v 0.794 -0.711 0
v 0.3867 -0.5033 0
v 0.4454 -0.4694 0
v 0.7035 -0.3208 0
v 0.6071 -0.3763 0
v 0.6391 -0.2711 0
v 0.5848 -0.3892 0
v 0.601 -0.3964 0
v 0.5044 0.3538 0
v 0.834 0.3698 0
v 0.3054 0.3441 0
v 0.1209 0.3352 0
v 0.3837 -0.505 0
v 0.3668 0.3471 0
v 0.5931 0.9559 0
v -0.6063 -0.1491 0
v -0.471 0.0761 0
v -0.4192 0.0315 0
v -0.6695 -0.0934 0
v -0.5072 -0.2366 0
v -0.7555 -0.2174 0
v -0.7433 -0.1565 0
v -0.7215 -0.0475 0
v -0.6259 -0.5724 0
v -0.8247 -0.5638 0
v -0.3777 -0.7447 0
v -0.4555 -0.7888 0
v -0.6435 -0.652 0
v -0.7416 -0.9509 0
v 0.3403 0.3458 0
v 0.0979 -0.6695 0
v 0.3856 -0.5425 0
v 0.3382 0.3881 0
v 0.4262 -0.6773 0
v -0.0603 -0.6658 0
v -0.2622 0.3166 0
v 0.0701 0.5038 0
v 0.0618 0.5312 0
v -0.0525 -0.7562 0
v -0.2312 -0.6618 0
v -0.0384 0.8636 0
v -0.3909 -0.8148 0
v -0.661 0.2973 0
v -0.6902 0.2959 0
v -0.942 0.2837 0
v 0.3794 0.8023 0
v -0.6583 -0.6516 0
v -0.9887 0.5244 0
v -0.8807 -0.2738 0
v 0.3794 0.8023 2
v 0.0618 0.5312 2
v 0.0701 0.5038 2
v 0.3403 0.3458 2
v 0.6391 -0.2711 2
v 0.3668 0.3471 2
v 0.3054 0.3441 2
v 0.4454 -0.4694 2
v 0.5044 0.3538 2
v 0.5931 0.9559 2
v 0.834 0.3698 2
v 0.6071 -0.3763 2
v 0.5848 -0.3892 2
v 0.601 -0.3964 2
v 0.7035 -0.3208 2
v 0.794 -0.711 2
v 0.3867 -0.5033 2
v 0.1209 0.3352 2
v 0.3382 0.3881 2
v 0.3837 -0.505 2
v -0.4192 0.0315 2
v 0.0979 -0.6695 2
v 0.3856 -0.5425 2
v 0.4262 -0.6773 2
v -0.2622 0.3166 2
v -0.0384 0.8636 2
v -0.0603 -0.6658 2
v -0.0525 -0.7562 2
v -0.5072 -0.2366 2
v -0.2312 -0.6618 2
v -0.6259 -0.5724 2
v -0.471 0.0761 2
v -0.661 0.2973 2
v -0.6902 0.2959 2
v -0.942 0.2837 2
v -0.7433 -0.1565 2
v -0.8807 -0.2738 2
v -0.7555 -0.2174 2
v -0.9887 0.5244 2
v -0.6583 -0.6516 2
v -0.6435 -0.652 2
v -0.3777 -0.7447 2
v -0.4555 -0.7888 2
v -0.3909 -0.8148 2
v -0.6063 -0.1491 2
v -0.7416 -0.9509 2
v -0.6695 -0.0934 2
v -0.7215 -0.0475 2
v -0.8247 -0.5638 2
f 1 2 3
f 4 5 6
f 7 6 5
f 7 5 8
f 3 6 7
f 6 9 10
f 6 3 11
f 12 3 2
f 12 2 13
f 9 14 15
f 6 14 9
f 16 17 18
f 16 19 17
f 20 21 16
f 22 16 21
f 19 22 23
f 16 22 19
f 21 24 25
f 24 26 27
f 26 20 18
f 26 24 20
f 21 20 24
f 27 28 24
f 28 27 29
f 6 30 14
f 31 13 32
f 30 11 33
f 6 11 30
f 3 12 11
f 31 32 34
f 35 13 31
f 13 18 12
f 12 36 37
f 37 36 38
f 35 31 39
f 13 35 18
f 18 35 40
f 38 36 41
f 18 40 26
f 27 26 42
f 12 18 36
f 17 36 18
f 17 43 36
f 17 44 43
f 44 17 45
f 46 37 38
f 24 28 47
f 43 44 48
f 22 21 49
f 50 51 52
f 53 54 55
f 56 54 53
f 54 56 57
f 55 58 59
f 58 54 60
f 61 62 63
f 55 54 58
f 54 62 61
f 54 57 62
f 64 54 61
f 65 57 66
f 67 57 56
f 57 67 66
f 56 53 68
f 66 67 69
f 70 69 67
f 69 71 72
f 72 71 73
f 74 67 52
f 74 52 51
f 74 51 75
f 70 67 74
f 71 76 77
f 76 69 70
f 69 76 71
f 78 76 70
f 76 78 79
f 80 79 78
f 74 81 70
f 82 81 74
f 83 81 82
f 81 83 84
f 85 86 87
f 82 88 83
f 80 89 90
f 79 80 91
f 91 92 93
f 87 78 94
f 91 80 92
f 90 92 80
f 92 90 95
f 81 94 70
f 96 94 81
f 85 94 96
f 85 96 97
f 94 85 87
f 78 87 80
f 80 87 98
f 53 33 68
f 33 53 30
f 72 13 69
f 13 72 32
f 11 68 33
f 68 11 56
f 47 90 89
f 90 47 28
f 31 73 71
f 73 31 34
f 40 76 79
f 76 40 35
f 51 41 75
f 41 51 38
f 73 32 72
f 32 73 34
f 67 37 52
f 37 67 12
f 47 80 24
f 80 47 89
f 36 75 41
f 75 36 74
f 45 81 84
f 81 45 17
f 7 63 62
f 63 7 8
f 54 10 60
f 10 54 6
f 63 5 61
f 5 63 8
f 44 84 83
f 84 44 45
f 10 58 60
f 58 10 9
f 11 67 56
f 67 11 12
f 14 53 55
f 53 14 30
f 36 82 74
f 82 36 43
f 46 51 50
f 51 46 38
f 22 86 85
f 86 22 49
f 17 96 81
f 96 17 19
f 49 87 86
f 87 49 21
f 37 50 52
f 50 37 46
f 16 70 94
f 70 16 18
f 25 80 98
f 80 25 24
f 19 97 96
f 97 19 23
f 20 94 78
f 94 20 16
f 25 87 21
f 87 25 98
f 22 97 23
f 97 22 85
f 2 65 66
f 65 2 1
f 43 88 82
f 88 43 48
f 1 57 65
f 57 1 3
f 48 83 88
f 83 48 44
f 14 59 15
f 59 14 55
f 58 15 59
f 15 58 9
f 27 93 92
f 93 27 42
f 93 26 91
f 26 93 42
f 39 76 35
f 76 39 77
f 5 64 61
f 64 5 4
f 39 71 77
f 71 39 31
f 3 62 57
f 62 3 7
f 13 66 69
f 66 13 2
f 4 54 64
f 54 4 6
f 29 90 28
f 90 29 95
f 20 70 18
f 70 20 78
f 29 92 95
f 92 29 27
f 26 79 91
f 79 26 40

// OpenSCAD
layers = 3*10;
scl_z = 2;
seed = 23;
vertices = [
    for(i = [0:layers-1]) 
        [
            rands(-1, 1, 1, seed+i)[0],
            rands(-1, 1, 1, seed+i+123)[0]
        ]
];

// take always 3 points and make a polygon out of it
for (i = [0 : 3 : layers-3]) {
    points = [
        [vertices[i][0], vertices[i][1]],
        [vertices[i+1][0], vertices[i+1][1]],
        [vertices[i+2][0], vertices[i+2][1]]
    ];
    faces = [[0,1,2]];
    color([rands(0,1,1,seed+i+456)[0], rands(0,1,1,seed+i+789)[0], rands(0,1,1,seed+i+101112)[0]])
    linear_extrude(height = scl_z)
        polygon(points = points, paths = faces);

}
